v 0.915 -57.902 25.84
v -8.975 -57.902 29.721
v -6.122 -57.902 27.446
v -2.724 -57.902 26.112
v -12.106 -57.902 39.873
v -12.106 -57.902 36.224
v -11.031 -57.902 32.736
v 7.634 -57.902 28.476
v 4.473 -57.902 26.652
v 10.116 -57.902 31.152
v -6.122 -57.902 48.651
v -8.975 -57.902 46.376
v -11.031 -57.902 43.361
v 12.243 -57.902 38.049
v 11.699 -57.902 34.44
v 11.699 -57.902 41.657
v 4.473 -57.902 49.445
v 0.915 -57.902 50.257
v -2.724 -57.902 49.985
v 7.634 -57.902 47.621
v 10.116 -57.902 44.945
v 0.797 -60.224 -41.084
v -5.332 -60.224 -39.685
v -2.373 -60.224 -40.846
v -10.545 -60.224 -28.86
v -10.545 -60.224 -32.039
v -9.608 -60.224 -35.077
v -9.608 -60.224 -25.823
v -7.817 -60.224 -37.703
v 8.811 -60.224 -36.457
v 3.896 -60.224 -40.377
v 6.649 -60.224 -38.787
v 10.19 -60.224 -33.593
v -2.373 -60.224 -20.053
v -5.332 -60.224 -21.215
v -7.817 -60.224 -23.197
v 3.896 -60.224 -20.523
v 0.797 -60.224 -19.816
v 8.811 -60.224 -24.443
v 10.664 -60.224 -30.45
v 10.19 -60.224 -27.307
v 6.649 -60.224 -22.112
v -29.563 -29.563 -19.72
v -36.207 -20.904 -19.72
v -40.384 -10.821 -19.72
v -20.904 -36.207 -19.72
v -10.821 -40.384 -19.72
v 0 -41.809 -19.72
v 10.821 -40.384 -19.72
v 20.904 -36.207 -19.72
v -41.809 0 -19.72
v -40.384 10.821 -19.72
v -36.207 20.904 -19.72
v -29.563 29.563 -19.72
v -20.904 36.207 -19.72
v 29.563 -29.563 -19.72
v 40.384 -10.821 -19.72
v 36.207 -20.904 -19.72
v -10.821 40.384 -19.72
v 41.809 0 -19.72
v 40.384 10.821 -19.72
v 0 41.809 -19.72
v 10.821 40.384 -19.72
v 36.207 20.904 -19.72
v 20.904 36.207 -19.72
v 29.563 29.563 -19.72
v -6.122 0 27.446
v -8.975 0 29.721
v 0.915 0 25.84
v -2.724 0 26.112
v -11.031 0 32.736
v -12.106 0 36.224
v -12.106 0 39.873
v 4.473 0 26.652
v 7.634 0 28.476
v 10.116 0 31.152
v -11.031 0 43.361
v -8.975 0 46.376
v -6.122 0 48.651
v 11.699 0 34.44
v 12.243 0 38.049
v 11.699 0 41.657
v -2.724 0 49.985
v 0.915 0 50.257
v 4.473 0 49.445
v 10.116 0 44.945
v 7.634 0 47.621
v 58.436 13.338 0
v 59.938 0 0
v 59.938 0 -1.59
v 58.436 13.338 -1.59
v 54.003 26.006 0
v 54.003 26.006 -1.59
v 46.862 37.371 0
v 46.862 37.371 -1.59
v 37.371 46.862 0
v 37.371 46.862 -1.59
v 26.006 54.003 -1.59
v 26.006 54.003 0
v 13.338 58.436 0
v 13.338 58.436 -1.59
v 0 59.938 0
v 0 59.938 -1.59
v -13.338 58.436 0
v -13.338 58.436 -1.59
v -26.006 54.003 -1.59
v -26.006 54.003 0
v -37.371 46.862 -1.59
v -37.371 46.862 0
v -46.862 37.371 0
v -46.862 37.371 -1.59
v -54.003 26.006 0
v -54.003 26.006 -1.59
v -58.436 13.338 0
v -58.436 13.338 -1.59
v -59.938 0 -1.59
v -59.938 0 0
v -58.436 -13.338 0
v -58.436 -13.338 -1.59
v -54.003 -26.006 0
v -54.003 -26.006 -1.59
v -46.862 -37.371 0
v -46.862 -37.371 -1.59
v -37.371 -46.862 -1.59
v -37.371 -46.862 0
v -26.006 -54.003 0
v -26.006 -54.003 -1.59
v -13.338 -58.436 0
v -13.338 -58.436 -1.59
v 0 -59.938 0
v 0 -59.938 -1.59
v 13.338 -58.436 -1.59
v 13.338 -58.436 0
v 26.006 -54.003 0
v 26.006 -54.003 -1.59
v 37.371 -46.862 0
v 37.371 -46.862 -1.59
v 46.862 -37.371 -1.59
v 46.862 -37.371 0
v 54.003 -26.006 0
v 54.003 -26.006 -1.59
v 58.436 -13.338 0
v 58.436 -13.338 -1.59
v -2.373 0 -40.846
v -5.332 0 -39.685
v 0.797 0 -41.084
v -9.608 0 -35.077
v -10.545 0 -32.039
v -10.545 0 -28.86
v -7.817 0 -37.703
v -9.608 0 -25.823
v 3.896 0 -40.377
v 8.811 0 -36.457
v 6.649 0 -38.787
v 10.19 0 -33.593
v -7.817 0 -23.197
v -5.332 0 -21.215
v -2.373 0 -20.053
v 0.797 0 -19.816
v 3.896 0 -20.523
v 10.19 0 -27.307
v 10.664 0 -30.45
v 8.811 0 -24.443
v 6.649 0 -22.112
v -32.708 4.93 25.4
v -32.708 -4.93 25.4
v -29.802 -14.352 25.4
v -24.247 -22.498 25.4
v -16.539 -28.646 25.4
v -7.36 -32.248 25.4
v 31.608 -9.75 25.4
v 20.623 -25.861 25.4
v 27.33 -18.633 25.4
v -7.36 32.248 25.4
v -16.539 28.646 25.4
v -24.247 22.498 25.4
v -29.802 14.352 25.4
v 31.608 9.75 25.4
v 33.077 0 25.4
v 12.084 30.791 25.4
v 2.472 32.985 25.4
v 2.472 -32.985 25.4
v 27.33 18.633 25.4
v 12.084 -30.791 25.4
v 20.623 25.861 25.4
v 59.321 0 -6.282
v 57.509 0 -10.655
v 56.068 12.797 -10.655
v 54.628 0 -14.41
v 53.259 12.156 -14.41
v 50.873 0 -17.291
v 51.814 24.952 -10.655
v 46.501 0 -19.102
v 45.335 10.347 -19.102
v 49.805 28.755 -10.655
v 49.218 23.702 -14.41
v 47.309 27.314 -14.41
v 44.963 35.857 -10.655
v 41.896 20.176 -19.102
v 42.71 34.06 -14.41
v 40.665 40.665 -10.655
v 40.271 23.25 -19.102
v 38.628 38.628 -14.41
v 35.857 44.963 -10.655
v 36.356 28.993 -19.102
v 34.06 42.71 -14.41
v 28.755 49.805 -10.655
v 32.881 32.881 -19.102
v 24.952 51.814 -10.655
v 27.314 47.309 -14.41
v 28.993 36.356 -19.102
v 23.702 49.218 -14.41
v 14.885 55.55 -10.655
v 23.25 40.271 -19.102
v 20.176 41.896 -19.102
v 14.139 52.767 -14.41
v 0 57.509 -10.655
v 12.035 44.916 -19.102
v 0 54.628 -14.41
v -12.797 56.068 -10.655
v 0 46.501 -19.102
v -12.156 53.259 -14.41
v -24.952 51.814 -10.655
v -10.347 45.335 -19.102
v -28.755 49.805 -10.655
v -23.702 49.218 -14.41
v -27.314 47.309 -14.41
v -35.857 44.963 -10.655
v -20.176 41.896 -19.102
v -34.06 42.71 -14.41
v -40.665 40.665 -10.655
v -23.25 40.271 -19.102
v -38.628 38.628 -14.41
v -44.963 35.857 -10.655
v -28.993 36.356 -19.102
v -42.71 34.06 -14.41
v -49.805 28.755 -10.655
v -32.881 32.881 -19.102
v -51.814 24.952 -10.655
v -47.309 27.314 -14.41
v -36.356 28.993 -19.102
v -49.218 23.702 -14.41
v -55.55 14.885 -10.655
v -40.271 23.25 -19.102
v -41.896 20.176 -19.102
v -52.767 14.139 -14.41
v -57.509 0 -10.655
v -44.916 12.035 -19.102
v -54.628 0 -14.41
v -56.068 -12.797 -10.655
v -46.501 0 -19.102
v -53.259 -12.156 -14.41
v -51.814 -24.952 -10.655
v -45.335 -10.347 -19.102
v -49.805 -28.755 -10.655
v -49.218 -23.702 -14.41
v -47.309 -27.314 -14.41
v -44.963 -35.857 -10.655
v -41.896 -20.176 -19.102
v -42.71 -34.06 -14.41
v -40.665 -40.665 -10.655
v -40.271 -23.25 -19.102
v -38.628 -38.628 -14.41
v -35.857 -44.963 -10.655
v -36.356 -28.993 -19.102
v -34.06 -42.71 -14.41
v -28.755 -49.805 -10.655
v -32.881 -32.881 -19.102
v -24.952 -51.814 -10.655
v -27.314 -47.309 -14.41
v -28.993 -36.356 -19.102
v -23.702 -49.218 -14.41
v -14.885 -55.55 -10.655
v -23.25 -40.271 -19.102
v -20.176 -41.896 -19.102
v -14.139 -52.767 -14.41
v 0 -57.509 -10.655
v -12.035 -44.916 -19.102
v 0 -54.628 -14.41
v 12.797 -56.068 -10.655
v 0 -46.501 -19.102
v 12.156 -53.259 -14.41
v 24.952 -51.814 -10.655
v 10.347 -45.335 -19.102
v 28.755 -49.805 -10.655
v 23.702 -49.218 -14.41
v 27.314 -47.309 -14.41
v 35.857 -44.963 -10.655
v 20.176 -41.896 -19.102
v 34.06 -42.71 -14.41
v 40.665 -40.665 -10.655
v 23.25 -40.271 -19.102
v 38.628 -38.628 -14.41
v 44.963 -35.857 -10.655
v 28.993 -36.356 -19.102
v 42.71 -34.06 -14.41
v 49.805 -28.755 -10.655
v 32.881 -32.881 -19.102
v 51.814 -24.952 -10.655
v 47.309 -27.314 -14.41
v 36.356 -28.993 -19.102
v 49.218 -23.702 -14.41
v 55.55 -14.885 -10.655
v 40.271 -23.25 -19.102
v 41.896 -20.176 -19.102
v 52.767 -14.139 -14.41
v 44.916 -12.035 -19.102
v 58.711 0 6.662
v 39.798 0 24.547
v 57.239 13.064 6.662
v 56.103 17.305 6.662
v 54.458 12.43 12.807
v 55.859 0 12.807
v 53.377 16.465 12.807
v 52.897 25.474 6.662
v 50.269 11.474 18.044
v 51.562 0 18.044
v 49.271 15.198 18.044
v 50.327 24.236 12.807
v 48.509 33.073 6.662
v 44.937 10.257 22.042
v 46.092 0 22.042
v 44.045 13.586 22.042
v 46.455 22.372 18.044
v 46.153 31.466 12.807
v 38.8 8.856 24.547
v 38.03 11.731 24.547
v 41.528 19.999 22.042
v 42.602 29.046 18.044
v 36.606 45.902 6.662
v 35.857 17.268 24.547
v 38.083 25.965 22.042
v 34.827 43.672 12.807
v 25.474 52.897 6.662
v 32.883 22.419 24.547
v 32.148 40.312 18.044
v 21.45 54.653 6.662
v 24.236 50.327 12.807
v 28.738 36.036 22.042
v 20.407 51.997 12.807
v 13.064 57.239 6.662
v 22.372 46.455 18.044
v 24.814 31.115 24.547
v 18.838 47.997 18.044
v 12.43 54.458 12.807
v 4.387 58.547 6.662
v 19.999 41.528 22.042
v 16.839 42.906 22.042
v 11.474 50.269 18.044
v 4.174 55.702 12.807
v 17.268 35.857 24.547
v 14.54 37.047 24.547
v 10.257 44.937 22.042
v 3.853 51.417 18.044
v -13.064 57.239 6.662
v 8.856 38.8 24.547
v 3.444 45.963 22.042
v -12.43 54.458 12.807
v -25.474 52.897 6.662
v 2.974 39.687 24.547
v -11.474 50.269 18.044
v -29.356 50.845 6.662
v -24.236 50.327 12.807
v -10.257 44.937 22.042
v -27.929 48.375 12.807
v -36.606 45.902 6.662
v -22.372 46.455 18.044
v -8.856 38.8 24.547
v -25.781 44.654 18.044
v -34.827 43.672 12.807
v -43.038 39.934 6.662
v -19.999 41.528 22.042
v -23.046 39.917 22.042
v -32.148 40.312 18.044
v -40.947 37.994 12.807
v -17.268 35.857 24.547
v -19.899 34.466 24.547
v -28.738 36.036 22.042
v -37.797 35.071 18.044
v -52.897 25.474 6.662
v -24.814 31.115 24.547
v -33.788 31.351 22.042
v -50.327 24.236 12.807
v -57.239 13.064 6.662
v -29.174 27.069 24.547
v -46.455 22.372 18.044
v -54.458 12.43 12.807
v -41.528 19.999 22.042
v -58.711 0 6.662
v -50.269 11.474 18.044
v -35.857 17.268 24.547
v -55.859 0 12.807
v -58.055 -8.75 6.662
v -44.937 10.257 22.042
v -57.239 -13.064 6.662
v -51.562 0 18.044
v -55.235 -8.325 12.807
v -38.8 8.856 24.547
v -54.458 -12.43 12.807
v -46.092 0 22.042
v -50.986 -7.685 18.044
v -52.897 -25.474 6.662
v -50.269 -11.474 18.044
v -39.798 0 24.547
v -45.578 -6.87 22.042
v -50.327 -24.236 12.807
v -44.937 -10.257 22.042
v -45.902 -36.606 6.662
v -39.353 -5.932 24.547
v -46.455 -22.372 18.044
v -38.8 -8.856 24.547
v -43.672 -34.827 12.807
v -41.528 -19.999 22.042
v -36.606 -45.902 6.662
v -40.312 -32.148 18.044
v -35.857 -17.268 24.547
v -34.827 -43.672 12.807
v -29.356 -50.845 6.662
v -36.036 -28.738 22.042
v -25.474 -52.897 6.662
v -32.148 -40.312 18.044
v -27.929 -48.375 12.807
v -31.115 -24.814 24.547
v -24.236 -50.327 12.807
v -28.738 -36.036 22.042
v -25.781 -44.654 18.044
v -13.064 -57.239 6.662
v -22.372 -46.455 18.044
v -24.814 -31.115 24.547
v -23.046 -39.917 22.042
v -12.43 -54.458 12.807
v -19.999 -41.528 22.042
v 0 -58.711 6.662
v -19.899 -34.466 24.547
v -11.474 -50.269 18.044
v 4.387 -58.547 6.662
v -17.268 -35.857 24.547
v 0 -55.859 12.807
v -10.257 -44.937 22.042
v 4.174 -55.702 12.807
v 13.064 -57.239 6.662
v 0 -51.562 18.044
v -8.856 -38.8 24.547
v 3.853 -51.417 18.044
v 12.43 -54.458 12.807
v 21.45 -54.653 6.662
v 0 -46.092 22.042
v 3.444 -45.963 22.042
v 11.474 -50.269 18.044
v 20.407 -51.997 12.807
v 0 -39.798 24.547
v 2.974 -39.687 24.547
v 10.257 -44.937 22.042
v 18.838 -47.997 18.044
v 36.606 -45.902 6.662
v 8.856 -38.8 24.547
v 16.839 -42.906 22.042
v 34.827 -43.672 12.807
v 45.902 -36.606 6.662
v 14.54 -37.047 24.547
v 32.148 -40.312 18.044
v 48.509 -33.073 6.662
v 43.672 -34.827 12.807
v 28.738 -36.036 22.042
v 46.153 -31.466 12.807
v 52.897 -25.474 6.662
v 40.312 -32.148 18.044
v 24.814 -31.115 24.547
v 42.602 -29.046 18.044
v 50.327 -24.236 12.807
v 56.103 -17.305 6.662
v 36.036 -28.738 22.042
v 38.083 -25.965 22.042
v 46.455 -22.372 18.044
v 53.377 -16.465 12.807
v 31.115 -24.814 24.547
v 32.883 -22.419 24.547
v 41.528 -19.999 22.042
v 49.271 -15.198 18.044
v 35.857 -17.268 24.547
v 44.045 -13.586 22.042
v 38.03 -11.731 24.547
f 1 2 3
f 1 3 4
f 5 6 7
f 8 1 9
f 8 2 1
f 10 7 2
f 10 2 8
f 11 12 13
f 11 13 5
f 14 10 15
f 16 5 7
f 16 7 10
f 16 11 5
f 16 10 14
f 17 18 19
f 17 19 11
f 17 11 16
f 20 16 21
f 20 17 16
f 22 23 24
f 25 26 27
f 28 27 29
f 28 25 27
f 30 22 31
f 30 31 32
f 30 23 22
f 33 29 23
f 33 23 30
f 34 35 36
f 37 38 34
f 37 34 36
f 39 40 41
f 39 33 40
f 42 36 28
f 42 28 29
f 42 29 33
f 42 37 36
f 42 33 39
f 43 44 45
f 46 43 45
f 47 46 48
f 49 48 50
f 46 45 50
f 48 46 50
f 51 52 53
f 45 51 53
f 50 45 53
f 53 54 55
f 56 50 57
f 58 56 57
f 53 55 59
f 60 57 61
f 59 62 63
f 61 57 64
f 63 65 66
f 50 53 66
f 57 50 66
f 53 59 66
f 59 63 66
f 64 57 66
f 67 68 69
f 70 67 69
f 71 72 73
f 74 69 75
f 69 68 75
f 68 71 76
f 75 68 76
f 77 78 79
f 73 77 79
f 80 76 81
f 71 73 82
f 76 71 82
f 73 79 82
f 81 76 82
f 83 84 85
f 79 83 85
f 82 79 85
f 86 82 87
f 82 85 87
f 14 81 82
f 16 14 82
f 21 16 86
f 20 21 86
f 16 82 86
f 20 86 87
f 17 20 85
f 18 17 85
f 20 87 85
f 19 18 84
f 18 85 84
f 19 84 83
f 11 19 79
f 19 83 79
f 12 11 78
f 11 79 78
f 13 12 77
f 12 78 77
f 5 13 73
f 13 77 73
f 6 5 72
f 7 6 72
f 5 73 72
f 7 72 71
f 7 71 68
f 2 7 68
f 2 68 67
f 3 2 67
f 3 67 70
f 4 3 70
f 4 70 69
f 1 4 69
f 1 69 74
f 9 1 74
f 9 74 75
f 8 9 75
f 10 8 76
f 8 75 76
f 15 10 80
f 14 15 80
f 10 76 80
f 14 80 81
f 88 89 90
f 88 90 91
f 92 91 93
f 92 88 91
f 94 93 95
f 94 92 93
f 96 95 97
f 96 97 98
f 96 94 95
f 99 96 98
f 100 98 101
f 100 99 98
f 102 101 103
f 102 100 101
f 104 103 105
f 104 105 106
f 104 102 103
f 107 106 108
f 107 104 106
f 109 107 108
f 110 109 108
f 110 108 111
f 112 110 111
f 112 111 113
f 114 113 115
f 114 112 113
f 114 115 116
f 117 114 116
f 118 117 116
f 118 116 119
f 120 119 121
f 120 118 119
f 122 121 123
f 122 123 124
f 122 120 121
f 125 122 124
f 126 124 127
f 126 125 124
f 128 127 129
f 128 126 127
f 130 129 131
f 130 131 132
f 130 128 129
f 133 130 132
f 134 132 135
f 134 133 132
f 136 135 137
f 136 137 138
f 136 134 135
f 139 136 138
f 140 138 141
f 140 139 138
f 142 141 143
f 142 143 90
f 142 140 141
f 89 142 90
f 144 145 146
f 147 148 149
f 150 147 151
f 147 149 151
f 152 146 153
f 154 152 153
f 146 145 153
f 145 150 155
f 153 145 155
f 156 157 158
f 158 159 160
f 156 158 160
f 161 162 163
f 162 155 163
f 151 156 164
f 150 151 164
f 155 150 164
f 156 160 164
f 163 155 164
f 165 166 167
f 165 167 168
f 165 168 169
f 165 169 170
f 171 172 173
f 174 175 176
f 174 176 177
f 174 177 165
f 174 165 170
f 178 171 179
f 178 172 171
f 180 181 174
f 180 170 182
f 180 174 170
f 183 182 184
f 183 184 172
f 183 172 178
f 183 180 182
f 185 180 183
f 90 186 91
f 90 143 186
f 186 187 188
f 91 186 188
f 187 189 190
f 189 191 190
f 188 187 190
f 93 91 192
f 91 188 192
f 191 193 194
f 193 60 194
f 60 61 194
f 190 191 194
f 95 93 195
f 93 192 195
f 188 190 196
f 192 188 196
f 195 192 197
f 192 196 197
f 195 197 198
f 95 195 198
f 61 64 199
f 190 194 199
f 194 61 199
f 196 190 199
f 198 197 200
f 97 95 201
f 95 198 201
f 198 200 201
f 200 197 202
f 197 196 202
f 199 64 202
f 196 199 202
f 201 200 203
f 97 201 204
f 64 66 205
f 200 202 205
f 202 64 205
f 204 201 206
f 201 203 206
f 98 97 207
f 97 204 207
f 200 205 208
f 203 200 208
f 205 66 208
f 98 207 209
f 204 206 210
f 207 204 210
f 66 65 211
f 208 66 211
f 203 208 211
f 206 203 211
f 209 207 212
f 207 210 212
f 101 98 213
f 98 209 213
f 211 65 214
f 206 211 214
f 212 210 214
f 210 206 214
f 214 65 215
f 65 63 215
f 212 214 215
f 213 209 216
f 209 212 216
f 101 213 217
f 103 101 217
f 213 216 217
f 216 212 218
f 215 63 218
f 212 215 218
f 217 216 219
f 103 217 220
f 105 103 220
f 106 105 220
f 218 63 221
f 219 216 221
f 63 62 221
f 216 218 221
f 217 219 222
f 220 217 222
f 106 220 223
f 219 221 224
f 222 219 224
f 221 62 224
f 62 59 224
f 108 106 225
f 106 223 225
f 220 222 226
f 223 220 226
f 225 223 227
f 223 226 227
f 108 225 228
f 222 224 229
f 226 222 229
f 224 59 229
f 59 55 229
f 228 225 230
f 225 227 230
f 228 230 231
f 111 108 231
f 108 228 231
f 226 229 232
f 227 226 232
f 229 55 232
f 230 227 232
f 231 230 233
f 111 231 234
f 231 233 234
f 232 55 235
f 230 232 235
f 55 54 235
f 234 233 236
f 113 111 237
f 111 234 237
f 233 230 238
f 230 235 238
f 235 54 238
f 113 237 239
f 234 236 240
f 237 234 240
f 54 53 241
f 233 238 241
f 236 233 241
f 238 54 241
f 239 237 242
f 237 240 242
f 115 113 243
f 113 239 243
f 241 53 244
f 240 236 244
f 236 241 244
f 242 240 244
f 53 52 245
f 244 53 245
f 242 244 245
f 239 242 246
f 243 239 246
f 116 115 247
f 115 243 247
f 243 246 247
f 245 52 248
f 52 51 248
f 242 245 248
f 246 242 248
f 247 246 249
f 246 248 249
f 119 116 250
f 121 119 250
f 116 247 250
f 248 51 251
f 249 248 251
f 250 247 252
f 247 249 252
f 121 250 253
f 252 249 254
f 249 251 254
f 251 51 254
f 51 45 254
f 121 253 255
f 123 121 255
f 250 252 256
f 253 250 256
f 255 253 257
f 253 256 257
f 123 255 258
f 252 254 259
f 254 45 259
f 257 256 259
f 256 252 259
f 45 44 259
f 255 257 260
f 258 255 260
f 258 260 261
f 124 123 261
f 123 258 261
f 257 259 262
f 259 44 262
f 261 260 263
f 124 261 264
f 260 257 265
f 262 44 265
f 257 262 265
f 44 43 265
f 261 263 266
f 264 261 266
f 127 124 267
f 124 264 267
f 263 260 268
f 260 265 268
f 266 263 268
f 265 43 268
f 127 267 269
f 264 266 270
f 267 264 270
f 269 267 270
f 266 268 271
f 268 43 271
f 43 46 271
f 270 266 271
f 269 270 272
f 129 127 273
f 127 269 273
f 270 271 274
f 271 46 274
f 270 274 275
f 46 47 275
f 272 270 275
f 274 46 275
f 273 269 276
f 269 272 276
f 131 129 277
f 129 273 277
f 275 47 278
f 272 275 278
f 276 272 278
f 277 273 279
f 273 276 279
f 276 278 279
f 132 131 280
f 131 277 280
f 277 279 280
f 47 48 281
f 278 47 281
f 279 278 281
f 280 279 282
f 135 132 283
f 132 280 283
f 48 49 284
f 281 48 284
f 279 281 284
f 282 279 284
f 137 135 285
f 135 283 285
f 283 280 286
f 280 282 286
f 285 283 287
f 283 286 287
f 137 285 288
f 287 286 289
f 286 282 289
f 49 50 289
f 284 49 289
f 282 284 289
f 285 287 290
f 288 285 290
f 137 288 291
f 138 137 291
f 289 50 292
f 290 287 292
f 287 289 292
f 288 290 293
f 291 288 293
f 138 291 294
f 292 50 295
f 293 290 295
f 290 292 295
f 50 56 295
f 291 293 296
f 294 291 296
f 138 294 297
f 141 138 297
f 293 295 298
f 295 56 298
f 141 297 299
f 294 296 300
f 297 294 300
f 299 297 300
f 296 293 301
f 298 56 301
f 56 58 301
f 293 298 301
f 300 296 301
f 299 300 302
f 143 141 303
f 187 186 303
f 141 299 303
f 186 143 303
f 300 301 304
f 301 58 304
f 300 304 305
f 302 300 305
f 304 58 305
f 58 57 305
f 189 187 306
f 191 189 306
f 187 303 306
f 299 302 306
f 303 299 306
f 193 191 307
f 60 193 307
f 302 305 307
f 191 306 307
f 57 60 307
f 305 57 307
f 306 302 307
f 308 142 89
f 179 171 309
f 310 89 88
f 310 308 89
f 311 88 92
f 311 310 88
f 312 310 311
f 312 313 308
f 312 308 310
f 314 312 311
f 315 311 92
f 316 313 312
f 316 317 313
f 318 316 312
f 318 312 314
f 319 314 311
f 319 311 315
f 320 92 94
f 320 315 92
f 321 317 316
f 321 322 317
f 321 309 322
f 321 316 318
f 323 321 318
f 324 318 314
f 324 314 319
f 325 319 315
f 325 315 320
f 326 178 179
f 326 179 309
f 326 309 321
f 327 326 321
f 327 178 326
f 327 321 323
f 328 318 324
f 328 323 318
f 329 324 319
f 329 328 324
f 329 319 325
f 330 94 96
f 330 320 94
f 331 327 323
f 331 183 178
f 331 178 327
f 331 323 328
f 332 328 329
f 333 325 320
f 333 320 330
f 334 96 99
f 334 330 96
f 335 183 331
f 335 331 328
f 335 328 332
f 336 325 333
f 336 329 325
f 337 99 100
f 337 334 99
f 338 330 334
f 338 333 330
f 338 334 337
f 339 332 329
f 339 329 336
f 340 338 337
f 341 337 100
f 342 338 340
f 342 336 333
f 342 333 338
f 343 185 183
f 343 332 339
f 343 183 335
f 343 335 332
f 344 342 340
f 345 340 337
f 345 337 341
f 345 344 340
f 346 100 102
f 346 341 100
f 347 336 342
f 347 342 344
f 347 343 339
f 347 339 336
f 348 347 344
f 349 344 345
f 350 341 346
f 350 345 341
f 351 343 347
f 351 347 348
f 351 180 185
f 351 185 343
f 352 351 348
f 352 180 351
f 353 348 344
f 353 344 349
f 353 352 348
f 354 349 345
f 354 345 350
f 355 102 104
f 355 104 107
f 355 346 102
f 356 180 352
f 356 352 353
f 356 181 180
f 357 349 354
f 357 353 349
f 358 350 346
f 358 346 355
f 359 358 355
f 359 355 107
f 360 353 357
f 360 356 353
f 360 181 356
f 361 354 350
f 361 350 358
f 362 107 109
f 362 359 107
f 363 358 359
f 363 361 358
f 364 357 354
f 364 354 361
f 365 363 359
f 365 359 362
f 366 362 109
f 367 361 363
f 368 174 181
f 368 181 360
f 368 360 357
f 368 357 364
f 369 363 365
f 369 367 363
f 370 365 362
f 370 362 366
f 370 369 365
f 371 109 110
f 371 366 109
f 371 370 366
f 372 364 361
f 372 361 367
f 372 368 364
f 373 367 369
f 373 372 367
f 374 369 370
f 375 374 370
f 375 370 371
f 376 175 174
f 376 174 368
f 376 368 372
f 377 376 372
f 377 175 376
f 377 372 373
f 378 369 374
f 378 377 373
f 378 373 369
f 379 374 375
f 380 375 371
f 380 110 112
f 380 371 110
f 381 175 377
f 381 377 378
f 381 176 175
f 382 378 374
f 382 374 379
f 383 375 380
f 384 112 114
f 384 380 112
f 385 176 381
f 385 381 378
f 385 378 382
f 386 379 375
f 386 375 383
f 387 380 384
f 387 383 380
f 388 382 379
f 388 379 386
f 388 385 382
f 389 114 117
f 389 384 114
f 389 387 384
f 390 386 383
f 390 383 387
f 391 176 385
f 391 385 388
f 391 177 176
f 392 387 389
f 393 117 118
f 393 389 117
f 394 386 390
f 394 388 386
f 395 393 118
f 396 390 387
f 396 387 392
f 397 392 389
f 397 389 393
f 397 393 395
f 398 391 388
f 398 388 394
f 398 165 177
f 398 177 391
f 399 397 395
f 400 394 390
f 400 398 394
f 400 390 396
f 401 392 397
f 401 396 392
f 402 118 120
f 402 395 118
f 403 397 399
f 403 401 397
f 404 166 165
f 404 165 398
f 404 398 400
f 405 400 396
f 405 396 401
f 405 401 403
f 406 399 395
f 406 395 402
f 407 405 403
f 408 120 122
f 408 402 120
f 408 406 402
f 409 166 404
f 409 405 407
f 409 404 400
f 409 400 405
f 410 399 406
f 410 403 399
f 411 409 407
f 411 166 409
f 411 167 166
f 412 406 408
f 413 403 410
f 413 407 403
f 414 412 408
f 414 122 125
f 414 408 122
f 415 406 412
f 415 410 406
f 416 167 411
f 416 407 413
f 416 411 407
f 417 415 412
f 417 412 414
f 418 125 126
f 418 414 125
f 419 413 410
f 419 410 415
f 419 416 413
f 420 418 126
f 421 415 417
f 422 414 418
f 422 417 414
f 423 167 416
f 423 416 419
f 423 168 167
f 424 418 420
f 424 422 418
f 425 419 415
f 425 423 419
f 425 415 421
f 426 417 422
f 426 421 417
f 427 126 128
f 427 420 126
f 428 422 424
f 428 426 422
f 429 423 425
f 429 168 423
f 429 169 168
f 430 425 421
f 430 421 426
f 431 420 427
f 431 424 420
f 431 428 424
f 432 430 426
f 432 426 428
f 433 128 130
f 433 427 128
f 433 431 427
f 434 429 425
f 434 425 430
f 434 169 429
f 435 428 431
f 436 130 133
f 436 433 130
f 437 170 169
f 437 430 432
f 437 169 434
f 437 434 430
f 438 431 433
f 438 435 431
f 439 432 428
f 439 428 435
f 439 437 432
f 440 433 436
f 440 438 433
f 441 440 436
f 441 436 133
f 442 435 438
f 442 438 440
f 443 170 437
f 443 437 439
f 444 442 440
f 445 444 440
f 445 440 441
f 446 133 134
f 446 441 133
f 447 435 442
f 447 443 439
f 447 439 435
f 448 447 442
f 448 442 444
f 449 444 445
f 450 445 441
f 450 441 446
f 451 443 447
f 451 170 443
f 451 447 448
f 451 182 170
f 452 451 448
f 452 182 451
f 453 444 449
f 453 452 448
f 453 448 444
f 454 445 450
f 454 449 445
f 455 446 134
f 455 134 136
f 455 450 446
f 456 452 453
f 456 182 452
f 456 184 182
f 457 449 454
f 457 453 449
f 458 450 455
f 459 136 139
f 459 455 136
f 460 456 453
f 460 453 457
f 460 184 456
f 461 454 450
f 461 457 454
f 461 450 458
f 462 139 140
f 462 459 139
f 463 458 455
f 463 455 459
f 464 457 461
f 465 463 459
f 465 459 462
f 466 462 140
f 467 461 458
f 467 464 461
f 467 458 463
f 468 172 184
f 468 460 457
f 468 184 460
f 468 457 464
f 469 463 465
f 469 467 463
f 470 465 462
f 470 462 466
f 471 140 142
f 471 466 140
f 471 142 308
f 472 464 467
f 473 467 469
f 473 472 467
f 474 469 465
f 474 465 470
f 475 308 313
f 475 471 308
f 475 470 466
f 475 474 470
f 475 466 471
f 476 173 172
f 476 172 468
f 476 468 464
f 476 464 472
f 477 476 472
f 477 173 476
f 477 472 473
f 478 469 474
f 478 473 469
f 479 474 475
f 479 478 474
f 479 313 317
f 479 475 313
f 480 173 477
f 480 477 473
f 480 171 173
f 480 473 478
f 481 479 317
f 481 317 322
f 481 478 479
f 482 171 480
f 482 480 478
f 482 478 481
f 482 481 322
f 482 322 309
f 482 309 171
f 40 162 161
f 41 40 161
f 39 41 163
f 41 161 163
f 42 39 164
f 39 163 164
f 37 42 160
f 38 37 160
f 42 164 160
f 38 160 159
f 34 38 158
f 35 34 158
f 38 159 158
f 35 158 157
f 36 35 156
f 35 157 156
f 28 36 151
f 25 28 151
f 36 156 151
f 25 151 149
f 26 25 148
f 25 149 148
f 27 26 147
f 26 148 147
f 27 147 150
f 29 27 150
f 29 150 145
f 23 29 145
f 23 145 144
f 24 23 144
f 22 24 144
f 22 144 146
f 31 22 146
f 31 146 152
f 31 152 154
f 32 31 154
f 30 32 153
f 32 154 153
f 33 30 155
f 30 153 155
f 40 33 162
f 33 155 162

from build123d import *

# Parameters (mm, degrees)
F0_R     = 59.9383278597
F2_DEPTH = 25.4
F1_R     = 59.9383278597
F4_DEPTH = 19.7198782116
F5_R     = 18.1296998075
F6_R     = 12.2432091335
F7_DEPTH = 57.9018350691
F8_R     = 10.663859886
F9_DEPTH = 60.2239668369


# Not quite as in the source:
# - a fillet or chamfer that OpenCascade refuses, or shapes differently, is made with other operations: its cross-section is extruded or revolved along the edge and cut away or added


with BuildPart() as f2:
    # F0 (on Top) → F2 (new body)
    with BuildSketch(Plane.XY):
        Circle(F0_R)
    extrude(amount=F2_DEPTH)

    # F3: fillet of radius 26.9030647894 on 1 edges, made by hand

    # F3_s1 → F3_t2 (revolve, cut)
    with BuildSketch(Plane.XZ):
        with BuildLine():
            ThreePointArc((59.9383278597, 0), (51.5615722779, 18.044466314), (33.0772837381, 25.4))
            Line((33.0772837381, 25.4), (59.9383278597, 25.4))
            Line((59.9383278597, 25.4), (59.9383278597, 0))
        make_face()
    revolve(axis=Axis((0, 0, 25.4), (0, 0, 1)), mode=Mode.SUBTRACT)

    # F1 (on face) → F4 (join)
    with BuildSketch(Plane.XY):
        Circle(F1_R)
    extrude(amount=-F4_DEPTH)

    # F5
    f5_edges = [f2.edges().sort_by_distance(p)[0] for p in [
        (-59.938328, 0, -19.719878),
    ]]
    fillet(f5_edges, radius=F5_R)


with BuildPart() as f7:
    # F6 (on Front) → F7 (new body)
    with BuildSketch(Plane.XZ):
        with Locations((0, 38.0485132337)):
            Circle(F6_R)
    extrude(amount=F7_DEPTH)


with BuildPart() as f9:
    # F8 (on Front) → F9 (new body)
    with BuildSketch(Plane.XZ):
        with Locations((0, -30.4498225451)):
            Circle(F8_R)
    extrude(amount=F9_DEPTH)


solid = Compound([f2.part, f7.part, f9.part])
